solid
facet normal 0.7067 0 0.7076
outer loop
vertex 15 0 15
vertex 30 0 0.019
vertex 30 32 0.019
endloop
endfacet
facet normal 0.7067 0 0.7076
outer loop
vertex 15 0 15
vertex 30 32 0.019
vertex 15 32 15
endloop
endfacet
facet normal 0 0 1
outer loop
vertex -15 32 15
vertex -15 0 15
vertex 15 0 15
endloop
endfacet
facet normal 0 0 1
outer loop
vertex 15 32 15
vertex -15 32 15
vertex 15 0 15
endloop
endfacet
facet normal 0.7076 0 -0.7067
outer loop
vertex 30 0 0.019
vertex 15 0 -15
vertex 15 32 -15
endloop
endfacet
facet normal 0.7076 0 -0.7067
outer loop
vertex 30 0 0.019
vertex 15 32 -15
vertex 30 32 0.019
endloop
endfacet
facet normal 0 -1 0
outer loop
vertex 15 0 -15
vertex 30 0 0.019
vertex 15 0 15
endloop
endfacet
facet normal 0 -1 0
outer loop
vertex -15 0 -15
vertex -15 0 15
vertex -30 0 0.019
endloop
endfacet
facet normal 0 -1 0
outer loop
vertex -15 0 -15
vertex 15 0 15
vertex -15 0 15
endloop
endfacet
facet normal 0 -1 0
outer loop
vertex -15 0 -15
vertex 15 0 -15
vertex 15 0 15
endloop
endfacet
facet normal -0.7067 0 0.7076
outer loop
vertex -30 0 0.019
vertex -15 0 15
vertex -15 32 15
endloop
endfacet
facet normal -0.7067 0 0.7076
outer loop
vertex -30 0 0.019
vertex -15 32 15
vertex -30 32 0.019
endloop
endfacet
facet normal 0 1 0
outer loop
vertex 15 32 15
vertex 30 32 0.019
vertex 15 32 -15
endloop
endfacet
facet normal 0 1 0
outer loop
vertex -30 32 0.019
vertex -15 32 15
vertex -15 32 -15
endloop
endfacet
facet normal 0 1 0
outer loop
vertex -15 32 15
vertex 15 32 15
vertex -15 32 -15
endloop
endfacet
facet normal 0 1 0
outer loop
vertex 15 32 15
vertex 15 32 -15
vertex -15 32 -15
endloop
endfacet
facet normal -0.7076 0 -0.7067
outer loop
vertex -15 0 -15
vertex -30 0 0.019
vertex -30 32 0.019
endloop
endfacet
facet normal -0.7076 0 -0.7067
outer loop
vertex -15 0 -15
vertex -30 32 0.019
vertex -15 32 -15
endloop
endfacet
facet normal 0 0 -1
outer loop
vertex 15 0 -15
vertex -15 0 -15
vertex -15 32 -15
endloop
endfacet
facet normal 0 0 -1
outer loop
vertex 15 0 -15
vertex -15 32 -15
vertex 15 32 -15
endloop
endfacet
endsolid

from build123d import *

# Parameters (mm, degrees)
SKETCH1_W           = 30
SKETCH1_H           = 30.000023288
BOSS_EXTRUDE2_DEPTH = 32


with BuildPart() as part:
    # Sketch1 → Boss-Extrude2 (new body)
    with BuildSketch(Plane(origin=(0, 0, 0), x_dir=(1, 0, 0), z_dir=(0, 1, 0))):
        Polygon((-15, 15.000011644), (-15, -15.000011644), (-30, -0.01868994), align=None)
        Rectangle(SKETCH1_W, SKETCH1_H)
        Polygon((30, -0.01868994), (15, -15.000011644), (15, 15.000011644), align=None)
    extrude(amount=BOSS_EXTRUDE2_DEPTH)


solid = part.part
